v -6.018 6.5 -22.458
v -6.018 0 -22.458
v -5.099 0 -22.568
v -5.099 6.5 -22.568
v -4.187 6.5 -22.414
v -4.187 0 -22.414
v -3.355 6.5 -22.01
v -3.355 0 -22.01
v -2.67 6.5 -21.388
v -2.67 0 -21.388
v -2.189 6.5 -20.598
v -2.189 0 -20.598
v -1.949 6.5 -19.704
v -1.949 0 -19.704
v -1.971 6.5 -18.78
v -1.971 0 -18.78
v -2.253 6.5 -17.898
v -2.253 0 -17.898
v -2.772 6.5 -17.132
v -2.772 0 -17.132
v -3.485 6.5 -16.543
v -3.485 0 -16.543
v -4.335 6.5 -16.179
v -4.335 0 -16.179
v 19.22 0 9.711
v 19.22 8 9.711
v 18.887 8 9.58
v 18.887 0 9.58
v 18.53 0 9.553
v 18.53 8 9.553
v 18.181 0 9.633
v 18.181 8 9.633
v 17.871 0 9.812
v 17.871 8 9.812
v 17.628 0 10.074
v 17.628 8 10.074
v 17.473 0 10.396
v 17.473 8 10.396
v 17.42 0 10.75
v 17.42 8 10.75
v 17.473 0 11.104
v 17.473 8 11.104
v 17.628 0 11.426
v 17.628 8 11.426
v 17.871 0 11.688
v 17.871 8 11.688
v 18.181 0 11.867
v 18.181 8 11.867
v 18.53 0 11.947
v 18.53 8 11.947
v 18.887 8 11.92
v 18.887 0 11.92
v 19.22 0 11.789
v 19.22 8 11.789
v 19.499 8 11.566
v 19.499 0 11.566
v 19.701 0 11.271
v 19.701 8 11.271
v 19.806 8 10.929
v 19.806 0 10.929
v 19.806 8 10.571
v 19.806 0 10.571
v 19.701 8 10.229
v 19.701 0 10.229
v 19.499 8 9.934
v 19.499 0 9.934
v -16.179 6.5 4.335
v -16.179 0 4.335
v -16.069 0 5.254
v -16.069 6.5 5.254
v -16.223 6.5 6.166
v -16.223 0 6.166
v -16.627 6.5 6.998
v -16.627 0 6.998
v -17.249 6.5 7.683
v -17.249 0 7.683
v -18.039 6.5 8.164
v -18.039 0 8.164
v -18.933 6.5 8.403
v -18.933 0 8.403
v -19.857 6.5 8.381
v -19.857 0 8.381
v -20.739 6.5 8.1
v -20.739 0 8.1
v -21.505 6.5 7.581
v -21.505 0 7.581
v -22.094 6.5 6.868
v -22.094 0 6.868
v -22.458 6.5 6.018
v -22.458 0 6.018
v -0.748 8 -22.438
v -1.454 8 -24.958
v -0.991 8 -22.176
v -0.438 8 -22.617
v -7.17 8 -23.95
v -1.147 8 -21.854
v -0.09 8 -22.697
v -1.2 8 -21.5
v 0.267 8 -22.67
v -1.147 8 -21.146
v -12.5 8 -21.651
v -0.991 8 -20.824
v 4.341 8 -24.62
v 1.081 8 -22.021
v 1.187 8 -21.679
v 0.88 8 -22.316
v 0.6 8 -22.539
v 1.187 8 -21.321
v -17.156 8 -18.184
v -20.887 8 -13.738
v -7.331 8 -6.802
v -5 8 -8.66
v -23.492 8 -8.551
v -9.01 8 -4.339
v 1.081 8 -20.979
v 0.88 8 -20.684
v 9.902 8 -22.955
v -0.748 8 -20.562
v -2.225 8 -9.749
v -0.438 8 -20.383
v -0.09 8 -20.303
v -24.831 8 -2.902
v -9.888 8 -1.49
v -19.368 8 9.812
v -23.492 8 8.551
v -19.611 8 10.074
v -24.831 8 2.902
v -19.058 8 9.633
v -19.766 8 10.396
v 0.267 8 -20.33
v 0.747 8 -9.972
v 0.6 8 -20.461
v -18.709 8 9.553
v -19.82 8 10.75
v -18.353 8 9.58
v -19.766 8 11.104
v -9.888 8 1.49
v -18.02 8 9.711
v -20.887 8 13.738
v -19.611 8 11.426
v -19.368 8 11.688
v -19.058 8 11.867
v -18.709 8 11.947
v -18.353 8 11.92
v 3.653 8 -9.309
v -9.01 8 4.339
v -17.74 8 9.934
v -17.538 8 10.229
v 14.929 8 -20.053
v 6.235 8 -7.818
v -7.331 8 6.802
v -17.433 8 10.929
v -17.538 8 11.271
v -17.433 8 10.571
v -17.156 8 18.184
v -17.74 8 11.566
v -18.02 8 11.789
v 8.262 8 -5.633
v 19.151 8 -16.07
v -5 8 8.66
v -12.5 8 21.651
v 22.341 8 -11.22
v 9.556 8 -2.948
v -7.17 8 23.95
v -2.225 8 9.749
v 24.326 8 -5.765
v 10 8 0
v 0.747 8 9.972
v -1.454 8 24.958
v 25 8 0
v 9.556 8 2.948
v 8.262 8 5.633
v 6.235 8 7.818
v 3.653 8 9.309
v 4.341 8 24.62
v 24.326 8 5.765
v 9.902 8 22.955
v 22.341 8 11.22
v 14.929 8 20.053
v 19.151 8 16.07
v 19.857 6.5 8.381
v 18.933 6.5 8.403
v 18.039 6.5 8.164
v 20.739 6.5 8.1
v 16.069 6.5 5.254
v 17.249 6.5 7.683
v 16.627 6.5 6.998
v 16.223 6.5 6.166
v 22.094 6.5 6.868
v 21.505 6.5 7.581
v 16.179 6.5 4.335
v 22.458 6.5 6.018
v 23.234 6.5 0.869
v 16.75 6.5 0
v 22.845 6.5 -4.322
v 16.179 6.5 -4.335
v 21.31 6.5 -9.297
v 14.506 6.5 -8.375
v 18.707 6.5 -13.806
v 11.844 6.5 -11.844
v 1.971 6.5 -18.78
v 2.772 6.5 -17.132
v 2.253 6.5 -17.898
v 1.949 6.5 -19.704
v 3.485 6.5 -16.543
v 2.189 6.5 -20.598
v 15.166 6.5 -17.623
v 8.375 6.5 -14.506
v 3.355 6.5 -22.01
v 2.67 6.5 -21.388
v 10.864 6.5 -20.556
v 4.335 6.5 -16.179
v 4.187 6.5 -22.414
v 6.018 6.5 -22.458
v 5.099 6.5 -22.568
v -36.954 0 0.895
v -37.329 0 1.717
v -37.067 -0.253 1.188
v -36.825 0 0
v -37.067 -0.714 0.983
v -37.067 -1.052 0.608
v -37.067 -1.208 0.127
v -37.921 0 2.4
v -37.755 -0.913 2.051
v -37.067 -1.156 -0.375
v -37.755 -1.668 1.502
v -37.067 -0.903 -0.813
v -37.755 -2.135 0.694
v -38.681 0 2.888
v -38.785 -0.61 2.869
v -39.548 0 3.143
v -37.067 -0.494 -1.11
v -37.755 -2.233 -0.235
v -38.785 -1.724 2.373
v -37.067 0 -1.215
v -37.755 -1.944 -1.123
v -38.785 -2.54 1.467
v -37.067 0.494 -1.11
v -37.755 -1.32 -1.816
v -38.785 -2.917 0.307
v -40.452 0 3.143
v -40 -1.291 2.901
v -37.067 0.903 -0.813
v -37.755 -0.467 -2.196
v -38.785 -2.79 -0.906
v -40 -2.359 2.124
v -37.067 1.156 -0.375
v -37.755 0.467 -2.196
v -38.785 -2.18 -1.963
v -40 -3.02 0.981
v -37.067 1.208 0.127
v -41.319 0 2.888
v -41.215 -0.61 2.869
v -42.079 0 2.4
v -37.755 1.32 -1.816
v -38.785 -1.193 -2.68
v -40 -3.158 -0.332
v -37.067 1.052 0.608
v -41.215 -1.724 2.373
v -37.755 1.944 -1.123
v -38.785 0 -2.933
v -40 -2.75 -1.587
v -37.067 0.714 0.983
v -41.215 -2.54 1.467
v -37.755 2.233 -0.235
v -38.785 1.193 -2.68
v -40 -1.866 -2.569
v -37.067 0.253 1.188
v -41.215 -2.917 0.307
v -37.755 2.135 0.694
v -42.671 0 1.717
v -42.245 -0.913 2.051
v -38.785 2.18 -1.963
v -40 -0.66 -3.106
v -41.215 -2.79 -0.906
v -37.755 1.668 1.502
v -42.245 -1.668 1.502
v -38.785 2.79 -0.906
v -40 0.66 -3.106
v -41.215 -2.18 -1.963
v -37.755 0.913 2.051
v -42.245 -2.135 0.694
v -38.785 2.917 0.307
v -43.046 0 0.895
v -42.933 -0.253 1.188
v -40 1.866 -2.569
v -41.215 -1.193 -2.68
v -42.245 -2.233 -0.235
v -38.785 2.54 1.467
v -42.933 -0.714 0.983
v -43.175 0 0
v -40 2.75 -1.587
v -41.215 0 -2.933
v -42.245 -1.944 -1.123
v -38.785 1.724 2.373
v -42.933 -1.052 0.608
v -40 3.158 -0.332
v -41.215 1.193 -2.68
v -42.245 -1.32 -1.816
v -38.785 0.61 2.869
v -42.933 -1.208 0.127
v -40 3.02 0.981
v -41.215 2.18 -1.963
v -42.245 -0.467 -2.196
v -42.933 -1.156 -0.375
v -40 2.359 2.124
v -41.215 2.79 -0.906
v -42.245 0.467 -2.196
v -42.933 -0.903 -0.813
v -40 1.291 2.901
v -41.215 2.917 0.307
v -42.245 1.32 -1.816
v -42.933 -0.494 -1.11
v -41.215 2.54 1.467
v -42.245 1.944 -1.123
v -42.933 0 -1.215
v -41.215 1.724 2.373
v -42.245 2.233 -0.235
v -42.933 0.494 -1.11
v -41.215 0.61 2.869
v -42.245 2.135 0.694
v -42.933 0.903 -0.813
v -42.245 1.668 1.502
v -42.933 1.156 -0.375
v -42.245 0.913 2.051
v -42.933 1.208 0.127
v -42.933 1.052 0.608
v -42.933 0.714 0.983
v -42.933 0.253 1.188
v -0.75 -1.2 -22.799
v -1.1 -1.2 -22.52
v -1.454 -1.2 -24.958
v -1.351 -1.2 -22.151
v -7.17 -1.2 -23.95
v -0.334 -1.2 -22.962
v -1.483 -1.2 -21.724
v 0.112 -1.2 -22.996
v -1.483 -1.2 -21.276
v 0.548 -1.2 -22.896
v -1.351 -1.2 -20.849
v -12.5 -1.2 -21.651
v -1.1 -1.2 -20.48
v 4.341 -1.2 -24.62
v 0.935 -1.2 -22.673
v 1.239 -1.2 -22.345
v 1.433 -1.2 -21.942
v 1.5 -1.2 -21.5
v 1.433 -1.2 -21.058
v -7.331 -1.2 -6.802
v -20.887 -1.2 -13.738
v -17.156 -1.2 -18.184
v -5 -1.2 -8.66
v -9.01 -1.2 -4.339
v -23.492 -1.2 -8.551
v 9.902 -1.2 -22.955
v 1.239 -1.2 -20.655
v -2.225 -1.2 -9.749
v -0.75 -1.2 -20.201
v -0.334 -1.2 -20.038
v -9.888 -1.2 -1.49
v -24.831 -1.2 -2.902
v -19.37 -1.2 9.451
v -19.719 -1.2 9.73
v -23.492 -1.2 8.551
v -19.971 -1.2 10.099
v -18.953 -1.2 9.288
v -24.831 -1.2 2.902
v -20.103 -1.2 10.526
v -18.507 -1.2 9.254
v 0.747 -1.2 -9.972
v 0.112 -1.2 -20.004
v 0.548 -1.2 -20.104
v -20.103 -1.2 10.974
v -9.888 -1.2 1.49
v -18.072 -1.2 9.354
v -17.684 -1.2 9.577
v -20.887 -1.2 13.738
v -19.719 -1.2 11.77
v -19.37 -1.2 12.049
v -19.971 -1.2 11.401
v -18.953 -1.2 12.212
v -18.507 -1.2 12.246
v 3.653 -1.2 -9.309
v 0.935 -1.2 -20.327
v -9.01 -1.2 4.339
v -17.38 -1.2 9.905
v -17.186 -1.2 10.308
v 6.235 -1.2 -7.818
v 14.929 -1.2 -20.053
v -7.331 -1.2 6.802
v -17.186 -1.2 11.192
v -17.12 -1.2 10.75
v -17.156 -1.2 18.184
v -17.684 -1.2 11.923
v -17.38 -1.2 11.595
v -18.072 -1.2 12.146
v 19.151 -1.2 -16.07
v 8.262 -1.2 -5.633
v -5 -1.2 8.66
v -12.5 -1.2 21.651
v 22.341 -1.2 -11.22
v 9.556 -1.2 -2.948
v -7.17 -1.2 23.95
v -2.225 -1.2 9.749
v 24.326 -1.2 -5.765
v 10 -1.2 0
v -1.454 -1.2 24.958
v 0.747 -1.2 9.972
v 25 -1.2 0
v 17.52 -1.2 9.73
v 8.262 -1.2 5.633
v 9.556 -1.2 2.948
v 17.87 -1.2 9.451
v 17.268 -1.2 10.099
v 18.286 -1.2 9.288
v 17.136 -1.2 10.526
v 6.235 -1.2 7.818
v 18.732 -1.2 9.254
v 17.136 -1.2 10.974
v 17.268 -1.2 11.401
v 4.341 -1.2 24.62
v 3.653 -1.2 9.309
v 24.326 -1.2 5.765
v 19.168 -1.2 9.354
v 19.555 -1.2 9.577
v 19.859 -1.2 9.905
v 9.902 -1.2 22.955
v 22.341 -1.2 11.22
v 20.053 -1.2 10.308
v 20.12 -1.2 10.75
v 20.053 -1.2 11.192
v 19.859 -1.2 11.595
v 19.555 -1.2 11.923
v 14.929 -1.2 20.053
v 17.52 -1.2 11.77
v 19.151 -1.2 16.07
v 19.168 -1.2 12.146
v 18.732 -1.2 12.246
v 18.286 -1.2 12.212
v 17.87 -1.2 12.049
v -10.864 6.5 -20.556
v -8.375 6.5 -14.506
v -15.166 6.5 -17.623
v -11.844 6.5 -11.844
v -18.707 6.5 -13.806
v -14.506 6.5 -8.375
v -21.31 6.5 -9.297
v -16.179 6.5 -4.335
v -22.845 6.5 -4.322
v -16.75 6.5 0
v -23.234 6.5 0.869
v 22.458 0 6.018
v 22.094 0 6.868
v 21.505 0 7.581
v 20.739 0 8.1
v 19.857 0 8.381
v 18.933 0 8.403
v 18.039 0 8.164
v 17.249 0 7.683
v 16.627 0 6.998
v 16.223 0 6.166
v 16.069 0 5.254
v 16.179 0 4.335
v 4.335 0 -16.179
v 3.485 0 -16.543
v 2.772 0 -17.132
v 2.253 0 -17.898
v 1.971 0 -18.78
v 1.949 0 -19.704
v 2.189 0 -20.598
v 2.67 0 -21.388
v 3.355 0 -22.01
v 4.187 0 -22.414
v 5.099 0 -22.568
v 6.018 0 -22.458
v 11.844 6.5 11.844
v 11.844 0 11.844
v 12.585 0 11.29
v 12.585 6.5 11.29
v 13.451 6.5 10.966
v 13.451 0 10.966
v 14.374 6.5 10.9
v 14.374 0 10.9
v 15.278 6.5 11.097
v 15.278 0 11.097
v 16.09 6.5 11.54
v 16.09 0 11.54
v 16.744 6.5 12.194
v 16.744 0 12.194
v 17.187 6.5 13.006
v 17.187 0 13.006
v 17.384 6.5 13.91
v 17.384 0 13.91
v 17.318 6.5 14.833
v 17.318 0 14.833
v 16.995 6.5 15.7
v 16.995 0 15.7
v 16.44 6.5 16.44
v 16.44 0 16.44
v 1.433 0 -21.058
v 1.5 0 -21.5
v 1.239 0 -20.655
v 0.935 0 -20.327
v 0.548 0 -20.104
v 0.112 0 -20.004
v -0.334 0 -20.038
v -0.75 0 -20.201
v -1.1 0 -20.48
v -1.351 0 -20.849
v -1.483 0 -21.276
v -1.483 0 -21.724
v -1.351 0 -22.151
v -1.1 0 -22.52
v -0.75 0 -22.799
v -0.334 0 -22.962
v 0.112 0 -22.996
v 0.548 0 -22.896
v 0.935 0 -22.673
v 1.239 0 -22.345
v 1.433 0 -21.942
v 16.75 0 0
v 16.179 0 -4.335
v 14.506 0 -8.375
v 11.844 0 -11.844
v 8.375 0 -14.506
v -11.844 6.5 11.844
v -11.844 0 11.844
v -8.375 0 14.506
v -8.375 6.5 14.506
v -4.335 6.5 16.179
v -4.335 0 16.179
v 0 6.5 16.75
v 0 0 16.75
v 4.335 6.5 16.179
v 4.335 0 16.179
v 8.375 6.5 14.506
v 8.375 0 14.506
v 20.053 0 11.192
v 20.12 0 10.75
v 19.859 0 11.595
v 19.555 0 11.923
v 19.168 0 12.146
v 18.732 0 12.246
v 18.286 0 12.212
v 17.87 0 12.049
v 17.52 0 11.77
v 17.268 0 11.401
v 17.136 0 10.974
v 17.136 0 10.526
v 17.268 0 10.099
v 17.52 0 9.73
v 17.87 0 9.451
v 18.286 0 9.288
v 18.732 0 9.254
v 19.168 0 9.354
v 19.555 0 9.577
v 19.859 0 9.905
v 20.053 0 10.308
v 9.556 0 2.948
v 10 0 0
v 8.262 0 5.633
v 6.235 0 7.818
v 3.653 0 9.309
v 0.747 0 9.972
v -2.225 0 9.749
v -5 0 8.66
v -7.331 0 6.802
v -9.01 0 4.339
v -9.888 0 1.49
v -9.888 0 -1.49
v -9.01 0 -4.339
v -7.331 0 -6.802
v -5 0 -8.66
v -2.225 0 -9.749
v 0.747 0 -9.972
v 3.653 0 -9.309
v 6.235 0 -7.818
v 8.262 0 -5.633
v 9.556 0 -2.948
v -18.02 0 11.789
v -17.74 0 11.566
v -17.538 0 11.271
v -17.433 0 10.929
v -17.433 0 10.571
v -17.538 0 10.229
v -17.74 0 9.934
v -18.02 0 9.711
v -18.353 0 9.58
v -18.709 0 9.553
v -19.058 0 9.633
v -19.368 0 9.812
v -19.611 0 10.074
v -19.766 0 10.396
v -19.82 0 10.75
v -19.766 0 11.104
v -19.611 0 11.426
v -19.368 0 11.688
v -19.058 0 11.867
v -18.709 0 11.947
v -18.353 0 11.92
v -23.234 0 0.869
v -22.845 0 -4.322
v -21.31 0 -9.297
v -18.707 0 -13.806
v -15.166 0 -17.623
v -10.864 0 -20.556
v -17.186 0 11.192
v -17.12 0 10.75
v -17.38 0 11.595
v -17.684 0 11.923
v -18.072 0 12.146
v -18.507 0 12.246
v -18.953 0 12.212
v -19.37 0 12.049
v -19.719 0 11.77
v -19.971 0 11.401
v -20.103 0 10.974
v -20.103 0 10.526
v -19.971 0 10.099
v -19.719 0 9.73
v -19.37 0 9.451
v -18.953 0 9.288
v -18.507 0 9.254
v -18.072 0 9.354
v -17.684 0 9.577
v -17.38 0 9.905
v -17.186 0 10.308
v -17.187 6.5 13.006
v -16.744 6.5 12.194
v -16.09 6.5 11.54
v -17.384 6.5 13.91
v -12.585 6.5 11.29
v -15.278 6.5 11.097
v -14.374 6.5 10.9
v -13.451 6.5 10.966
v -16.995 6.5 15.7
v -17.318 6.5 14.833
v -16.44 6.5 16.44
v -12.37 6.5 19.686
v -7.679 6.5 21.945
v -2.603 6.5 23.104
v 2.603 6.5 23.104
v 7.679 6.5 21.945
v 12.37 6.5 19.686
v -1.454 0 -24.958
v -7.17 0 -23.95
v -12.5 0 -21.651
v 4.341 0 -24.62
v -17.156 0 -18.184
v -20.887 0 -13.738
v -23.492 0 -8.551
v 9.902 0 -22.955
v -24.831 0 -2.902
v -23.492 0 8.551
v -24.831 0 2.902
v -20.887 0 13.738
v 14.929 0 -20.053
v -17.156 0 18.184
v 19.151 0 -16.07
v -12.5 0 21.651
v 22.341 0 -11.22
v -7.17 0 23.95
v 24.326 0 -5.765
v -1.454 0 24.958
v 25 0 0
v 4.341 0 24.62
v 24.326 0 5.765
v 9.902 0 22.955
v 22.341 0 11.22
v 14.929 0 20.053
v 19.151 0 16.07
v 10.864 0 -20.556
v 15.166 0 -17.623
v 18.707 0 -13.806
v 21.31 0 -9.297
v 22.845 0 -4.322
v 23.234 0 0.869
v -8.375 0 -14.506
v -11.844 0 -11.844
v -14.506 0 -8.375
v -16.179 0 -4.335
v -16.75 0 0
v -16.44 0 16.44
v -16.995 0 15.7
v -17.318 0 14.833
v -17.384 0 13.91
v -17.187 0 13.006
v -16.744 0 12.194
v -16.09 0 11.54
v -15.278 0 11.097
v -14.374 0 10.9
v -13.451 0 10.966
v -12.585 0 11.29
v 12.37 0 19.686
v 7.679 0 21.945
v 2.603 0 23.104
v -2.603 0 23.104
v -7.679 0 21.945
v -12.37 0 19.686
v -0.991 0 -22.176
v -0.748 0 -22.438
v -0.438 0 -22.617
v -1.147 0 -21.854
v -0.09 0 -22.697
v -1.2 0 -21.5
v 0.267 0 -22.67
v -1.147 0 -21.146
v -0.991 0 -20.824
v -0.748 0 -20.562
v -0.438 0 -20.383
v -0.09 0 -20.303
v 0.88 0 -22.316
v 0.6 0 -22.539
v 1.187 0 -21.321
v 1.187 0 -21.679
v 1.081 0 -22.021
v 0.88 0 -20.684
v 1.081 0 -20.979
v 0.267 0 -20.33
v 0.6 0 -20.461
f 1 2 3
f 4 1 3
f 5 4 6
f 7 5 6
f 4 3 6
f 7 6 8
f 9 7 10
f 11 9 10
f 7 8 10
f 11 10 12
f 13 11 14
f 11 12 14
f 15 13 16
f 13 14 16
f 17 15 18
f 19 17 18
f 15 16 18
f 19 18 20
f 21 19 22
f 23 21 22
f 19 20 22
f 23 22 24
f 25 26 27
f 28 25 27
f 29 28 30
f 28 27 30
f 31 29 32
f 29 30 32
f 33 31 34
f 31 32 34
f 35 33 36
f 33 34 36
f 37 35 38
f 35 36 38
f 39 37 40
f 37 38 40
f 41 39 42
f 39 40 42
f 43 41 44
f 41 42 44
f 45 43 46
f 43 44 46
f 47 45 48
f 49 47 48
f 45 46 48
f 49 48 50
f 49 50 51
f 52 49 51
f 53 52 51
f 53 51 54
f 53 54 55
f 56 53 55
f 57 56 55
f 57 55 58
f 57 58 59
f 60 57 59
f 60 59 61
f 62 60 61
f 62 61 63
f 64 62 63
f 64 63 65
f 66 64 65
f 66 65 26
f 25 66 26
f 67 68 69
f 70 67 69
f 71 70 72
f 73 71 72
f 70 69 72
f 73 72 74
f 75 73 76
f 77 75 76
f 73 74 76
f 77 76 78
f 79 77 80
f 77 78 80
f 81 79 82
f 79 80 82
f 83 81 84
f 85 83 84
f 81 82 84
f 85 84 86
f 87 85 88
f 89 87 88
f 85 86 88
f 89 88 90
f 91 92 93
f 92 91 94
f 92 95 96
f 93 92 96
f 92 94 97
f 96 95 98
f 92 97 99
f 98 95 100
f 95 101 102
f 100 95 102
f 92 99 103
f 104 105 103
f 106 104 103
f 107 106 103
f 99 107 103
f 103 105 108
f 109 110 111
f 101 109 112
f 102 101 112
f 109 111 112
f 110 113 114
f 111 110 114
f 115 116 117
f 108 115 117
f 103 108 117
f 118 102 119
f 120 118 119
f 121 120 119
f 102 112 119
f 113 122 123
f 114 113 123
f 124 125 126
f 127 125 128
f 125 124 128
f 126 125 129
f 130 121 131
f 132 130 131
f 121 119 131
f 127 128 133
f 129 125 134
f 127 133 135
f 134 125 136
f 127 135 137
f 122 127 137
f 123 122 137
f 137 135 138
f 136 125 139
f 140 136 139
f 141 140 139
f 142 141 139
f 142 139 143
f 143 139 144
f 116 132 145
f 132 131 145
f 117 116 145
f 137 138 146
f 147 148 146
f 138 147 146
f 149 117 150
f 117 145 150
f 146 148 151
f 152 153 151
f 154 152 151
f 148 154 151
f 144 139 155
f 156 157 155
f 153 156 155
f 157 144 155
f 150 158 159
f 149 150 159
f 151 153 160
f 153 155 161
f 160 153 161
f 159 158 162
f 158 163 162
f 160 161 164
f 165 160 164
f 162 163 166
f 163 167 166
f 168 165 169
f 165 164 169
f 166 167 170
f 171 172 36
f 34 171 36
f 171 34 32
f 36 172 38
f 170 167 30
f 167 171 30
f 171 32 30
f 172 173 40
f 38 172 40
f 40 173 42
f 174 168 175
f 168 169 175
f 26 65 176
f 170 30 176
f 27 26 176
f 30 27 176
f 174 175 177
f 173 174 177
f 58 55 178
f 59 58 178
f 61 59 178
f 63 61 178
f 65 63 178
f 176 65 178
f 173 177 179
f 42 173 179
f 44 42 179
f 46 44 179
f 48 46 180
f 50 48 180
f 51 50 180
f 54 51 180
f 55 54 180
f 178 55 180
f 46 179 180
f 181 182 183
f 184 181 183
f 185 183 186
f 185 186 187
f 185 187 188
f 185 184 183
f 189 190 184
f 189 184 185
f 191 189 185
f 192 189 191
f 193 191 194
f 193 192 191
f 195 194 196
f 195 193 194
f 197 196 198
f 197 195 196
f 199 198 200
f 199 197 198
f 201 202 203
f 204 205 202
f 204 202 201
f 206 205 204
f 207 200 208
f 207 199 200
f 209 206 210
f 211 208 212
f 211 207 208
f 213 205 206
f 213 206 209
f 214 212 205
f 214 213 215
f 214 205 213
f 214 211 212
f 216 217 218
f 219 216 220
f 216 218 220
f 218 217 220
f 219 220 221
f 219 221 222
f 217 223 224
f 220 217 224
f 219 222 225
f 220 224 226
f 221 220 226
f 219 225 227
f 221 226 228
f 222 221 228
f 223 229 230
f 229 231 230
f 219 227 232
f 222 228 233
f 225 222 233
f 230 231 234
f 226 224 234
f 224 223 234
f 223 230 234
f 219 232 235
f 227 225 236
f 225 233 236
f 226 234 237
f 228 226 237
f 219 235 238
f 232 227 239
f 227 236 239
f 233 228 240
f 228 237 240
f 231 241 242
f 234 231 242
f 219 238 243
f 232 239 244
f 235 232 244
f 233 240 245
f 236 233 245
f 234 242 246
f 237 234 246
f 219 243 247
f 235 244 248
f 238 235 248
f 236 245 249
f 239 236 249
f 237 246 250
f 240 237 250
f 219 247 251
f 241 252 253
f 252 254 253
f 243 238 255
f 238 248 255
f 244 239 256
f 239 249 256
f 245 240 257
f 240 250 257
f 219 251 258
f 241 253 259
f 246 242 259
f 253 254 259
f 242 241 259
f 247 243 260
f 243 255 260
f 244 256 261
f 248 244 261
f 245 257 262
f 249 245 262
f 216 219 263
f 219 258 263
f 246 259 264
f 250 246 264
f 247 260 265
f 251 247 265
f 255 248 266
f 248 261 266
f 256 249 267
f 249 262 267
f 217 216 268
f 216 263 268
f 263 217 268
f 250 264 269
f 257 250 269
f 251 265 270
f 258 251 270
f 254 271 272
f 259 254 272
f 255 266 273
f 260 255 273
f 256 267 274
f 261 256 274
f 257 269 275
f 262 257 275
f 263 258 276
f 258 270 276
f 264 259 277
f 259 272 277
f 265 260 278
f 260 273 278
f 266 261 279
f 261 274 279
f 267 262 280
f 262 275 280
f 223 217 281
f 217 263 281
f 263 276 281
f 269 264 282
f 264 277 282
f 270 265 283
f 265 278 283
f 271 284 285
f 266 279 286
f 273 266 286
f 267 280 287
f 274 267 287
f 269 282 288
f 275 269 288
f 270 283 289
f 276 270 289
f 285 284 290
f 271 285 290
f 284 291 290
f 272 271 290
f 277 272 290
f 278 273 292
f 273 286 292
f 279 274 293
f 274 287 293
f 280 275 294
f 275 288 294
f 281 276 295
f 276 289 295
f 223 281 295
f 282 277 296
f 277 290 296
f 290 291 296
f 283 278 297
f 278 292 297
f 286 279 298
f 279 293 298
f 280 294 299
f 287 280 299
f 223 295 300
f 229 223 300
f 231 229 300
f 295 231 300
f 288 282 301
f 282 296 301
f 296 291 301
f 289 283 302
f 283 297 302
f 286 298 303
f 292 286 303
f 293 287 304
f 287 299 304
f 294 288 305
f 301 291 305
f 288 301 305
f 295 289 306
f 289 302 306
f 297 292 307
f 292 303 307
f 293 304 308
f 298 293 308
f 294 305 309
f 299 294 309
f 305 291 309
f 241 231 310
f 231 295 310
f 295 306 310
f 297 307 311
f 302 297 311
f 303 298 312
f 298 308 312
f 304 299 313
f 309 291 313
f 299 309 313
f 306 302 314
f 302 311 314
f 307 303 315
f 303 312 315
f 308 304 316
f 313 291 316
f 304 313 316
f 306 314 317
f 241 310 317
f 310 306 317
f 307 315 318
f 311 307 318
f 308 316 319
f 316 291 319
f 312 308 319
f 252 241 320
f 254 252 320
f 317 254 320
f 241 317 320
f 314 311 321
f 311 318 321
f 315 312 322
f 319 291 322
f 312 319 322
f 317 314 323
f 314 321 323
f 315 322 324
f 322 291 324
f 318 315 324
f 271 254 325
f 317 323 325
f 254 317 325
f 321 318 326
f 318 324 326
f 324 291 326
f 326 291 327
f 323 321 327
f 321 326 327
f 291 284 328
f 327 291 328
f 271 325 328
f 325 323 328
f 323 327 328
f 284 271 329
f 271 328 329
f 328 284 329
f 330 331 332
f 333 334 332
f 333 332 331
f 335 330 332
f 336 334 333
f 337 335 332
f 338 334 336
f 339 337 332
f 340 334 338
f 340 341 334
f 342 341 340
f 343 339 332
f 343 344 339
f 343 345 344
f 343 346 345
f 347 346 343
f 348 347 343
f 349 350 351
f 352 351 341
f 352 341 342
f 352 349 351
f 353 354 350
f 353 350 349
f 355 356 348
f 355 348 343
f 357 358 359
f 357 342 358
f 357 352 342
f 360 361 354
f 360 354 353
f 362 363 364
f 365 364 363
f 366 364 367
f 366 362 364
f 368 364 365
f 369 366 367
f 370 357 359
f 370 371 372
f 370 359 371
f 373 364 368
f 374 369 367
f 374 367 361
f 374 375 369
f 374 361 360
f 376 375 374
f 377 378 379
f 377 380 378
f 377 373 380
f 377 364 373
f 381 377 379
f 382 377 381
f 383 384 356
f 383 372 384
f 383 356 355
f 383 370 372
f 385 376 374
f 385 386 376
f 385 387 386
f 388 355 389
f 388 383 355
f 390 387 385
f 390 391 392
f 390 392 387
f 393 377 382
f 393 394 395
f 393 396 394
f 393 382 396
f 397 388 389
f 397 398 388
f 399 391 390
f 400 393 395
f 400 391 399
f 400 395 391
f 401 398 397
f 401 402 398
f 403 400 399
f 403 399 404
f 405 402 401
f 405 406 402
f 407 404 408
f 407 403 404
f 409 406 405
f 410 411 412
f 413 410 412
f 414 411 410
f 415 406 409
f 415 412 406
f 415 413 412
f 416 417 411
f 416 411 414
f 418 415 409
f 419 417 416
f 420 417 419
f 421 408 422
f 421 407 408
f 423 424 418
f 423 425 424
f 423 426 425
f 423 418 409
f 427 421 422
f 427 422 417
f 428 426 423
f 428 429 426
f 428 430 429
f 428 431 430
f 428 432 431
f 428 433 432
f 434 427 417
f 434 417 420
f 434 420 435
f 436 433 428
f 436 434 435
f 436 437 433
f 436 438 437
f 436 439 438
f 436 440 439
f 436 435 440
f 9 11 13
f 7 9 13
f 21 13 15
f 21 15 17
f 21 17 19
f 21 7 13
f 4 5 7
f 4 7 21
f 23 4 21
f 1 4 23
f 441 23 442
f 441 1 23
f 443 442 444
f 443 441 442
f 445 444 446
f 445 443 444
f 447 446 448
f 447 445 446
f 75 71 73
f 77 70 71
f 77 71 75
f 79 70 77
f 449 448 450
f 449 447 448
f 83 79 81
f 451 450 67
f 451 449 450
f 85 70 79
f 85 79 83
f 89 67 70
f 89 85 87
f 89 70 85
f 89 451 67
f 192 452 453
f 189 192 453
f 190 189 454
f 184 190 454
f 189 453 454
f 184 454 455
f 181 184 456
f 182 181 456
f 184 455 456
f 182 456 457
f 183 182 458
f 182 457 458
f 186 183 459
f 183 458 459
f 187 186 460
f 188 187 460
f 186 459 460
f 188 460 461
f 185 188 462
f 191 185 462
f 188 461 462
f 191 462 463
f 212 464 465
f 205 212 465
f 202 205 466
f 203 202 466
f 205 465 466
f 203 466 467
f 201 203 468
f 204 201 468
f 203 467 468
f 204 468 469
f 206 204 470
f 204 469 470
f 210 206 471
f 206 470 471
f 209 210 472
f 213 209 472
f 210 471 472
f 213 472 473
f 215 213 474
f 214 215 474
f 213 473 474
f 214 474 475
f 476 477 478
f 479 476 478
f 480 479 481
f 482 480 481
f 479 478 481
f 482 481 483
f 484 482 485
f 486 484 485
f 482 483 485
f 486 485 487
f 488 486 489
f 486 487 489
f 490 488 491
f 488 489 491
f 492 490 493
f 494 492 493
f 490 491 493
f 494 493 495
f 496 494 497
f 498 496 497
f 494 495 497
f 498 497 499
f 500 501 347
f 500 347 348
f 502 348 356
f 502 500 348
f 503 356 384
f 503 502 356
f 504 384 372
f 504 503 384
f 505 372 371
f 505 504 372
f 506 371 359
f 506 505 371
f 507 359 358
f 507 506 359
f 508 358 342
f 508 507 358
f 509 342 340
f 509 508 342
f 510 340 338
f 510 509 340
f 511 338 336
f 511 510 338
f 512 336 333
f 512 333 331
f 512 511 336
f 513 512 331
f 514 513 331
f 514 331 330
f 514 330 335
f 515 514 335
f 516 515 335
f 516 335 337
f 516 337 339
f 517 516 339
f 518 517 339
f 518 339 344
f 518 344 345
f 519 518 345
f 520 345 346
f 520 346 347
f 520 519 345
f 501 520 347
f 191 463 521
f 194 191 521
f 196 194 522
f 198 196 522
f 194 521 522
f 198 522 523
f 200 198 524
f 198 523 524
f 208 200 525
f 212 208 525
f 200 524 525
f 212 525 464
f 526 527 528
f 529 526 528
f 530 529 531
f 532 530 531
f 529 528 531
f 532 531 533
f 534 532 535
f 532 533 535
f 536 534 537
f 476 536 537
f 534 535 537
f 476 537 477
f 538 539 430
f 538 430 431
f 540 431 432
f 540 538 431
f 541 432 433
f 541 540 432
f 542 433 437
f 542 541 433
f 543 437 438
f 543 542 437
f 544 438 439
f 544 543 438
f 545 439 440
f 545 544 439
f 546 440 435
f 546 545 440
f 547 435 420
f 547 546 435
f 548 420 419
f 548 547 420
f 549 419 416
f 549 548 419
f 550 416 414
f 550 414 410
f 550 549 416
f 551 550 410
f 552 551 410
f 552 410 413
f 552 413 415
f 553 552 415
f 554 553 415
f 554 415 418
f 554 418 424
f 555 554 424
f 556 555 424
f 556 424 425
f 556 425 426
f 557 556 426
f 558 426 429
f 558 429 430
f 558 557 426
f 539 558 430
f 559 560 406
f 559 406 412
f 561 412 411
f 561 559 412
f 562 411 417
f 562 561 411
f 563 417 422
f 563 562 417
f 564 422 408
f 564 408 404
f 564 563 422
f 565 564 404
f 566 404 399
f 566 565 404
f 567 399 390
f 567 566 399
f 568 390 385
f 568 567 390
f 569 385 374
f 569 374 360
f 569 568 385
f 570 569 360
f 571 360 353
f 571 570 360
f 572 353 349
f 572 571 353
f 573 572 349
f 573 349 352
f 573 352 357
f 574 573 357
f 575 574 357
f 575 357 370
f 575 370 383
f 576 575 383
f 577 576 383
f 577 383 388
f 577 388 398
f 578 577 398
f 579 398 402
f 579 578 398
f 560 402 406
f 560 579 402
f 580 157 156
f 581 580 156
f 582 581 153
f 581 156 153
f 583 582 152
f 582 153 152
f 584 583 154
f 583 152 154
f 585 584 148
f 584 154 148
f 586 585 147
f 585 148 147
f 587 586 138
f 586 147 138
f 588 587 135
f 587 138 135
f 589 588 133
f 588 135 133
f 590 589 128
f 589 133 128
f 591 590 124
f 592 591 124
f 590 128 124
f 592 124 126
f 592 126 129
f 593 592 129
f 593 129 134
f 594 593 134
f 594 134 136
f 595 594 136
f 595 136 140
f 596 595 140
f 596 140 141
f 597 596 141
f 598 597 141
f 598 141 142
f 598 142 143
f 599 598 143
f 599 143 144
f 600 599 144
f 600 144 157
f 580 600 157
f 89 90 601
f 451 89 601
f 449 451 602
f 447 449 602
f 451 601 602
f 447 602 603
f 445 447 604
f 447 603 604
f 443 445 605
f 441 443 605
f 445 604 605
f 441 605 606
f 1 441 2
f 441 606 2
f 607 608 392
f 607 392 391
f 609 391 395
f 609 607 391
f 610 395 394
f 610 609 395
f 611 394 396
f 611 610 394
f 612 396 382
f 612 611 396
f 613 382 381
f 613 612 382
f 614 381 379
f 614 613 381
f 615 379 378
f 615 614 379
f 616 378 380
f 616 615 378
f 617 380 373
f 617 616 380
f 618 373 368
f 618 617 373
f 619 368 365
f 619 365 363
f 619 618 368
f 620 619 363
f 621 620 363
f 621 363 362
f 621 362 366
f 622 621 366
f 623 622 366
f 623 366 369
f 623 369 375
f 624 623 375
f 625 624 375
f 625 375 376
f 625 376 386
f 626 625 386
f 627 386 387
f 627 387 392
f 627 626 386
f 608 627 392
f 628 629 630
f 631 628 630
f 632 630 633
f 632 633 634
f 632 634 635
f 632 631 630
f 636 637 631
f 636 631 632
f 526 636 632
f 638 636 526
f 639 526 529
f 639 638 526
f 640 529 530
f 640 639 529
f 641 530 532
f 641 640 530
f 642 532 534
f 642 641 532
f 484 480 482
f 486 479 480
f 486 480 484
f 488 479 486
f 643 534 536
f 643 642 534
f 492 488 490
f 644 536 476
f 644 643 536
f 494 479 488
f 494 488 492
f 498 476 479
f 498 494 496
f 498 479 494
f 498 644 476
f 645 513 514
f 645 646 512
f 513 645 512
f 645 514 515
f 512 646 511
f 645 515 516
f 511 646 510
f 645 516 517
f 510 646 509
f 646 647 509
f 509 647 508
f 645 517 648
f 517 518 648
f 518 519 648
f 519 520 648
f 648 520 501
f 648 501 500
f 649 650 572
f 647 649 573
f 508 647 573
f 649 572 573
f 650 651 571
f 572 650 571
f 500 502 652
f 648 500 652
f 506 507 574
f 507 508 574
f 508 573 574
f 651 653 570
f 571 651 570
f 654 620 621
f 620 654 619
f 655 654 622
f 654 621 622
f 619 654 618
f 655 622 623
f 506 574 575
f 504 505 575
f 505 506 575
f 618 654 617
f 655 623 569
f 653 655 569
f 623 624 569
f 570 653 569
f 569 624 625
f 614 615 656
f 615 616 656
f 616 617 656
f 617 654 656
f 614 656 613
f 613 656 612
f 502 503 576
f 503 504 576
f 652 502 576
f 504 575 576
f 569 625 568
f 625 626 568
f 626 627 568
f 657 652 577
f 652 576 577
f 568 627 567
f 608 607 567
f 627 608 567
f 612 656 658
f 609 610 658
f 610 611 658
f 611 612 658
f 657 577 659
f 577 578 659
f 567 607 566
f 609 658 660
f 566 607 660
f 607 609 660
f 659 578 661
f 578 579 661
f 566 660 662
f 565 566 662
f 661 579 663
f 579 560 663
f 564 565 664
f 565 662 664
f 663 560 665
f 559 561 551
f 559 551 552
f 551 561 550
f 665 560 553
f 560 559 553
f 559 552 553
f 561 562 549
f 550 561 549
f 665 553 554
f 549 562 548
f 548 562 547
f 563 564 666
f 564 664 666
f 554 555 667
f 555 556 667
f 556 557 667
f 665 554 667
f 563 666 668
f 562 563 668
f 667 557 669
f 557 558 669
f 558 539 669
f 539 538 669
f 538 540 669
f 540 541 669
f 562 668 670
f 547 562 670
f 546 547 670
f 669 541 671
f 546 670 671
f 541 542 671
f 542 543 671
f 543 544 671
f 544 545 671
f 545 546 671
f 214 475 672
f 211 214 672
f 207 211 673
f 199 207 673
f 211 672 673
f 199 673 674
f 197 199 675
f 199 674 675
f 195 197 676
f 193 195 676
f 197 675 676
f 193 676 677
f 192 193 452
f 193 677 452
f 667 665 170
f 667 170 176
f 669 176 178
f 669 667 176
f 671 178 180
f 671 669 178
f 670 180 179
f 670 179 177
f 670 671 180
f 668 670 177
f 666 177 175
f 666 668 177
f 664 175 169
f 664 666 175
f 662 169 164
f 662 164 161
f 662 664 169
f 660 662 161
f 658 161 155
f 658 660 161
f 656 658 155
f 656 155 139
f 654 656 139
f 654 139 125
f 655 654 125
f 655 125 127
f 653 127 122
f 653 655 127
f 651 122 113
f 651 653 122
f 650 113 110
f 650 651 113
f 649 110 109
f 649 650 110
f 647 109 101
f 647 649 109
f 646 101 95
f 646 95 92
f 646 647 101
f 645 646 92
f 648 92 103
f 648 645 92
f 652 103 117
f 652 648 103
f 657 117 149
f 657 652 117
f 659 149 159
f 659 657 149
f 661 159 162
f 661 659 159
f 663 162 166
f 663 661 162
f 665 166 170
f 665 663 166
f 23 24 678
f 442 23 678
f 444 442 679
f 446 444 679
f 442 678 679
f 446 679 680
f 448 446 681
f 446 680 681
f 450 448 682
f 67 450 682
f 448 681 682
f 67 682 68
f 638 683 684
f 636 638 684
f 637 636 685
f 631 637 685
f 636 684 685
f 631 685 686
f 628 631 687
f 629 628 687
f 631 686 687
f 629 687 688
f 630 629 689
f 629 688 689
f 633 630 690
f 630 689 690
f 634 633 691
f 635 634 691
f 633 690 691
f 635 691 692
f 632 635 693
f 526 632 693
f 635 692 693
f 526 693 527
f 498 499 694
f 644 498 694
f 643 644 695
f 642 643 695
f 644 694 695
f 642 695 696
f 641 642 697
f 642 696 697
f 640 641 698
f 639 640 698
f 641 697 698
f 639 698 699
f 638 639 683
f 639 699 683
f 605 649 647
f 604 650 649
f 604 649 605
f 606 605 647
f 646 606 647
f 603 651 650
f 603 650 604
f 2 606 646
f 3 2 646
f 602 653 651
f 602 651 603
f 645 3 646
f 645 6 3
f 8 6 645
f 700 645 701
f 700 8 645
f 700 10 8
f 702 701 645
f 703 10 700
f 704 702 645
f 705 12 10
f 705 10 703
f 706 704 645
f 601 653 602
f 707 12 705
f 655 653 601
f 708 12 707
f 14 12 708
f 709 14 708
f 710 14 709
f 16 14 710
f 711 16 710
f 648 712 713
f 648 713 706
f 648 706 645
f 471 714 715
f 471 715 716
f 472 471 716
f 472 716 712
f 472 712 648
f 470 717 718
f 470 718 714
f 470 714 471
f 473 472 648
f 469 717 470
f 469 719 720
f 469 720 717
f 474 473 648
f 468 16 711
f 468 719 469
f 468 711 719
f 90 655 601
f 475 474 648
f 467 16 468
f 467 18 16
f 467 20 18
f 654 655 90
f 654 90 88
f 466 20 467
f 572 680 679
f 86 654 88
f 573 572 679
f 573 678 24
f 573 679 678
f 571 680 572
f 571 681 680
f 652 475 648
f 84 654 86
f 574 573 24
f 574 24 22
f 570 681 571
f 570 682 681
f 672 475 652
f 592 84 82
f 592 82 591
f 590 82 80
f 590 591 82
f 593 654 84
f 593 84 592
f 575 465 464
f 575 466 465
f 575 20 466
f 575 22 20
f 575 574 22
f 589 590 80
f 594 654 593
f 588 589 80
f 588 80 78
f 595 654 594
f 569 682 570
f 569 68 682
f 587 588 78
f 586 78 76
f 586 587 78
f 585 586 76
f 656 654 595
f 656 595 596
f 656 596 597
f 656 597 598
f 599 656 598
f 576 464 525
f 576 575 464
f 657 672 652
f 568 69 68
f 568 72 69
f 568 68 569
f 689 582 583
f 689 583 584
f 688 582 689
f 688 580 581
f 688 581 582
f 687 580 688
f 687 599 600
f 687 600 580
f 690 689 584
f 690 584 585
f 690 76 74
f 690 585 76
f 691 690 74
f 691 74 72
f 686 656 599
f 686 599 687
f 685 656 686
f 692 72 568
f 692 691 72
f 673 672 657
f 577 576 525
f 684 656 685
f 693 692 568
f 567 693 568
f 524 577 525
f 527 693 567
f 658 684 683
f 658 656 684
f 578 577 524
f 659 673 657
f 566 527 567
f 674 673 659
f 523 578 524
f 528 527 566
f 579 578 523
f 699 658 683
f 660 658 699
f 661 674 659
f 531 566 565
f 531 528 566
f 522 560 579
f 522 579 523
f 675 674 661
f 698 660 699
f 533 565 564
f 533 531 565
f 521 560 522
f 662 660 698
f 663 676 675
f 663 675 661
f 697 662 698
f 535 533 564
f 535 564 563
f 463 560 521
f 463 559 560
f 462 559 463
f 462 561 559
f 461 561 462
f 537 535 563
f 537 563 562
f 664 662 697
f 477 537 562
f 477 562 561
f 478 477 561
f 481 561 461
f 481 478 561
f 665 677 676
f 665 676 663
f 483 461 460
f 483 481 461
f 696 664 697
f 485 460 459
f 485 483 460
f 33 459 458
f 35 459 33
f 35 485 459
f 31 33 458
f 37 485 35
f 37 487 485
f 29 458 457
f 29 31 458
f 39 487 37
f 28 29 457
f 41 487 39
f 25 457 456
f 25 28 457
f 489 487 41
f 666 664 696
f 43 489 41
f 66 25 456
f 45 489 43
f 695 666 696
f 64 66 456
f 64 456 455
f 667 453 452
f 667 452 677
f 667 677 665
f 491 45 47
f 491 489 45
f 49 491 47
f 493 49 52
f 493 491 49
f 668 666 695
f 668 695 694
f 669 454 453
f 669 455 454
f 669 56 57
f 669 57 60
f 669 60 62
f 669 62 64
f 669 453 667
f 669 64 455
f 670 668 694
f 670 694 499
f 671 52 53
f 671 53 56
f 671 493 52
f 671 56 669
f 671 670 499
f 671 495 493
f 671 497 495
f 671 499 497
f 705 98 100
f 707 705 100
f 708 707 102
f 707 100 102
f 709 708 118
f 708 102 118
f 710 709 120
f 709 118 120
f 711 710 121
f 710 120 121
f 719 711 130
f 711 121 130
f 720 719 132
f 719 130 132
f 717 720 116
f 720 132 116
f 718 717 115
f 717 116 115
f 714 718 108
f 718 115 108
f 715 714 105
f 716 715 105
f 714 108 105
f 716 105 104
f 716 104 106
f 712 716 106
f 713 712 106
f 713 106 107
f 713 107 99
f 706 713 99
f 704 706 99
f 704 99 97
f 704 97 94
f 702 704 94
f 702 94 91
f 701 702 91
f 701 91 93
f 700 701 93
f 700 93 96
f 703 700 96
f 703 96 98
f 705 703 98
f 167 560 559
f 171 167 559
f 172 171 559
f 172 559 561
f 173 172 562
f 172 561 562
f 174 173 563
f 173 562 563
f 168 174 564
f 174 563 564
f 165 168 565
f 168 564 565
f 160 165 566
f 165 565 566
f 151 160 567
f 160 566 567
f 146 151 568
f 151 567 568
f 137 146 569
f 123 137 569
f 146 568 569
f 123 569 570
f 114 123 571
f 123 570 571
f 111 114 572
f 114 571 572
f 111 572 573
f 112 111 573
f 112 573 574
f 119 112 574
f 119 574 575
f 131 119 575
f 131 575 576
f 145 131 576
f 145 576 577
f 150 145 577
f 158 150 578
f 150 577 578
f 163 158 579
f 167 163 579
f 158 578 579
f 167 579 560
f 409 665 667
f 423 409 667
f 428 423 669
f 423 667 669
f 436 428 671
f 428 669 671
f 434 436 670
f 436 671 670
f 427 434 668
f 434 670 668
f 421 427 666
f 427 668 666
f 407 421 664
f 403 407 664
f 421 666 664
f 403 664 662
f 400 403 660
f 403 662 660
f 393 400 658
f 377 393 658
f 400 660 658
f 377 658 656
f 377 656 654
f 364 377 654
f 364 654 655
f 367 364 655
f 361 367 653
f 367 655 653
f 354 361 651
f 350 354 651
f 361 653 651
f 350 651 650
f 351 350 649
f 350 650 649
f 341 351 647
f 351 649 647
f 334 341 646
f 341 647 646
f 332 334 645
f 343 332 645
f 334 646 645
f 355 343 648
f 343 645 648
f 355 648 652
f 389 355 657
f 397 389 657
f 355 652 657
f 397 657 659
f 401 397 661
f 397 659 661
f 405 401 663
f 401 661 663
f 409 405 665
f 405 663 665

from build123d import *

# Parameters (mm, degrees)
F0_R            = 25
F0_R_2          = 10
F1_DEPTH        = 8
F3_DEPTH        = 6.5
F3_COPIES_COUNT = 3
F5_D            = 2.4
F5_COPIES_COUNT = 3
F6_R            = 25
F6_R_2          = 1.5
F6_R_3          = 10
F7_DEPTH        = 1.2


# Not quite as in the source:
# - a pattern or mirror of a feature is missing from the dataset's text; its kind, count and spacing are read off the source's solid


with BuildPart() as f1:
    # F0 (on Front) → F1 (new body)
    with BuildSketch(Plane.XZ):
        Circle(F0_R)
        Circle(F0_R_2, mode=Mode.SUBTRACT)
    extrude(amount=-F1_DEPTH)

    # F2 (on face) → F3 (cut)
    with BuildSketch(Plane.XZ):
        with BuildLine():
            ThreePointArc((-16.4402326626, 16.4402326626), (-16.4402326626, 11.8440385849), (-11.8440385849, 11.8440385849))
            ThreePointArc((-11.8440385849, 11.8440385849), (0, 16.75), (11.8440385849, 11.8440385849))
            ThreePointArc((11.8440385849, 11.8440385849), (16.4402326626, 11.8440385849), (16.4402326626, 16.4402326626))
            ThreePointArc((16.4402326626, 16.4402326626), (0, 23.25), (-16.4402326626, 16.4402326626))
        make_face()
    f3 = extrude(amount=-F3_DEPTH, mode=Mode.SUBTRACT)

    # F3_copies: F3 ×3 about axis
    f3_copies_axis = Axis((0, 0, 0), (0, 1, 0))
    for i in range(1, F3_COPIES_COUNT):
        add(f3.rotate(f3_copies_axis, i * 360 / F3_COPIES_COUNT), mode=Mode.SUBTRACT)

    # F5 (through all)
    with Locations(Plane.XZ):
        with Locations((0, -21.5)):
            f5 = Hole(F5_D / 2)

    # F5_copies: F5 ×3 about axis
    f5_copies_axis = Axis((0, 0, 0), (0, 1, 0))
    for i in range(1, F5_COPIES_COUNT):
        add(f5.rotate(f5_copies_axis, i * 360 / F5_COPIES_COUNT), mode=Mode.SUBTRACT)


with BuildPart() as f7:
    # F6 (on face) → F7 (new body)
    with BuildSketch(Plane.XZ):
        Circle(F6_R)
        with Locations((0, -21.5)):
            Circle(F6_R_2, mode=Mode.SUBTRACT)
        with Locations((-18.6195461814, 10.75)):
            Circle(F6_R_2, mode=Mode.SUBTRACT)
        Circle(F6_R_3, mode=Mode.SUBTRACT)
        with Locations((18.6195461814, 10.75)):
            Circle(F6_R_2, mode=Mode.SUBTRACT)
    extrude(amount=F7_DEPTH)


with BuildPart() as f9:
    # F8 (on Front) → F9 (revolve)
    with BuildSketch(Plane.XZ):
        with BuildLine():
            Line((-43.175, 0), (-36.825, 0))
            ThreePointArc((-36.825, 0), (-40, 3.175), (-43.175, 0))
        make_face()
    revolve(axis=Axis((-40, 0, 0), (1, 0, 0)))


solid = Compound([f1.part, f7.part, f9.part])
